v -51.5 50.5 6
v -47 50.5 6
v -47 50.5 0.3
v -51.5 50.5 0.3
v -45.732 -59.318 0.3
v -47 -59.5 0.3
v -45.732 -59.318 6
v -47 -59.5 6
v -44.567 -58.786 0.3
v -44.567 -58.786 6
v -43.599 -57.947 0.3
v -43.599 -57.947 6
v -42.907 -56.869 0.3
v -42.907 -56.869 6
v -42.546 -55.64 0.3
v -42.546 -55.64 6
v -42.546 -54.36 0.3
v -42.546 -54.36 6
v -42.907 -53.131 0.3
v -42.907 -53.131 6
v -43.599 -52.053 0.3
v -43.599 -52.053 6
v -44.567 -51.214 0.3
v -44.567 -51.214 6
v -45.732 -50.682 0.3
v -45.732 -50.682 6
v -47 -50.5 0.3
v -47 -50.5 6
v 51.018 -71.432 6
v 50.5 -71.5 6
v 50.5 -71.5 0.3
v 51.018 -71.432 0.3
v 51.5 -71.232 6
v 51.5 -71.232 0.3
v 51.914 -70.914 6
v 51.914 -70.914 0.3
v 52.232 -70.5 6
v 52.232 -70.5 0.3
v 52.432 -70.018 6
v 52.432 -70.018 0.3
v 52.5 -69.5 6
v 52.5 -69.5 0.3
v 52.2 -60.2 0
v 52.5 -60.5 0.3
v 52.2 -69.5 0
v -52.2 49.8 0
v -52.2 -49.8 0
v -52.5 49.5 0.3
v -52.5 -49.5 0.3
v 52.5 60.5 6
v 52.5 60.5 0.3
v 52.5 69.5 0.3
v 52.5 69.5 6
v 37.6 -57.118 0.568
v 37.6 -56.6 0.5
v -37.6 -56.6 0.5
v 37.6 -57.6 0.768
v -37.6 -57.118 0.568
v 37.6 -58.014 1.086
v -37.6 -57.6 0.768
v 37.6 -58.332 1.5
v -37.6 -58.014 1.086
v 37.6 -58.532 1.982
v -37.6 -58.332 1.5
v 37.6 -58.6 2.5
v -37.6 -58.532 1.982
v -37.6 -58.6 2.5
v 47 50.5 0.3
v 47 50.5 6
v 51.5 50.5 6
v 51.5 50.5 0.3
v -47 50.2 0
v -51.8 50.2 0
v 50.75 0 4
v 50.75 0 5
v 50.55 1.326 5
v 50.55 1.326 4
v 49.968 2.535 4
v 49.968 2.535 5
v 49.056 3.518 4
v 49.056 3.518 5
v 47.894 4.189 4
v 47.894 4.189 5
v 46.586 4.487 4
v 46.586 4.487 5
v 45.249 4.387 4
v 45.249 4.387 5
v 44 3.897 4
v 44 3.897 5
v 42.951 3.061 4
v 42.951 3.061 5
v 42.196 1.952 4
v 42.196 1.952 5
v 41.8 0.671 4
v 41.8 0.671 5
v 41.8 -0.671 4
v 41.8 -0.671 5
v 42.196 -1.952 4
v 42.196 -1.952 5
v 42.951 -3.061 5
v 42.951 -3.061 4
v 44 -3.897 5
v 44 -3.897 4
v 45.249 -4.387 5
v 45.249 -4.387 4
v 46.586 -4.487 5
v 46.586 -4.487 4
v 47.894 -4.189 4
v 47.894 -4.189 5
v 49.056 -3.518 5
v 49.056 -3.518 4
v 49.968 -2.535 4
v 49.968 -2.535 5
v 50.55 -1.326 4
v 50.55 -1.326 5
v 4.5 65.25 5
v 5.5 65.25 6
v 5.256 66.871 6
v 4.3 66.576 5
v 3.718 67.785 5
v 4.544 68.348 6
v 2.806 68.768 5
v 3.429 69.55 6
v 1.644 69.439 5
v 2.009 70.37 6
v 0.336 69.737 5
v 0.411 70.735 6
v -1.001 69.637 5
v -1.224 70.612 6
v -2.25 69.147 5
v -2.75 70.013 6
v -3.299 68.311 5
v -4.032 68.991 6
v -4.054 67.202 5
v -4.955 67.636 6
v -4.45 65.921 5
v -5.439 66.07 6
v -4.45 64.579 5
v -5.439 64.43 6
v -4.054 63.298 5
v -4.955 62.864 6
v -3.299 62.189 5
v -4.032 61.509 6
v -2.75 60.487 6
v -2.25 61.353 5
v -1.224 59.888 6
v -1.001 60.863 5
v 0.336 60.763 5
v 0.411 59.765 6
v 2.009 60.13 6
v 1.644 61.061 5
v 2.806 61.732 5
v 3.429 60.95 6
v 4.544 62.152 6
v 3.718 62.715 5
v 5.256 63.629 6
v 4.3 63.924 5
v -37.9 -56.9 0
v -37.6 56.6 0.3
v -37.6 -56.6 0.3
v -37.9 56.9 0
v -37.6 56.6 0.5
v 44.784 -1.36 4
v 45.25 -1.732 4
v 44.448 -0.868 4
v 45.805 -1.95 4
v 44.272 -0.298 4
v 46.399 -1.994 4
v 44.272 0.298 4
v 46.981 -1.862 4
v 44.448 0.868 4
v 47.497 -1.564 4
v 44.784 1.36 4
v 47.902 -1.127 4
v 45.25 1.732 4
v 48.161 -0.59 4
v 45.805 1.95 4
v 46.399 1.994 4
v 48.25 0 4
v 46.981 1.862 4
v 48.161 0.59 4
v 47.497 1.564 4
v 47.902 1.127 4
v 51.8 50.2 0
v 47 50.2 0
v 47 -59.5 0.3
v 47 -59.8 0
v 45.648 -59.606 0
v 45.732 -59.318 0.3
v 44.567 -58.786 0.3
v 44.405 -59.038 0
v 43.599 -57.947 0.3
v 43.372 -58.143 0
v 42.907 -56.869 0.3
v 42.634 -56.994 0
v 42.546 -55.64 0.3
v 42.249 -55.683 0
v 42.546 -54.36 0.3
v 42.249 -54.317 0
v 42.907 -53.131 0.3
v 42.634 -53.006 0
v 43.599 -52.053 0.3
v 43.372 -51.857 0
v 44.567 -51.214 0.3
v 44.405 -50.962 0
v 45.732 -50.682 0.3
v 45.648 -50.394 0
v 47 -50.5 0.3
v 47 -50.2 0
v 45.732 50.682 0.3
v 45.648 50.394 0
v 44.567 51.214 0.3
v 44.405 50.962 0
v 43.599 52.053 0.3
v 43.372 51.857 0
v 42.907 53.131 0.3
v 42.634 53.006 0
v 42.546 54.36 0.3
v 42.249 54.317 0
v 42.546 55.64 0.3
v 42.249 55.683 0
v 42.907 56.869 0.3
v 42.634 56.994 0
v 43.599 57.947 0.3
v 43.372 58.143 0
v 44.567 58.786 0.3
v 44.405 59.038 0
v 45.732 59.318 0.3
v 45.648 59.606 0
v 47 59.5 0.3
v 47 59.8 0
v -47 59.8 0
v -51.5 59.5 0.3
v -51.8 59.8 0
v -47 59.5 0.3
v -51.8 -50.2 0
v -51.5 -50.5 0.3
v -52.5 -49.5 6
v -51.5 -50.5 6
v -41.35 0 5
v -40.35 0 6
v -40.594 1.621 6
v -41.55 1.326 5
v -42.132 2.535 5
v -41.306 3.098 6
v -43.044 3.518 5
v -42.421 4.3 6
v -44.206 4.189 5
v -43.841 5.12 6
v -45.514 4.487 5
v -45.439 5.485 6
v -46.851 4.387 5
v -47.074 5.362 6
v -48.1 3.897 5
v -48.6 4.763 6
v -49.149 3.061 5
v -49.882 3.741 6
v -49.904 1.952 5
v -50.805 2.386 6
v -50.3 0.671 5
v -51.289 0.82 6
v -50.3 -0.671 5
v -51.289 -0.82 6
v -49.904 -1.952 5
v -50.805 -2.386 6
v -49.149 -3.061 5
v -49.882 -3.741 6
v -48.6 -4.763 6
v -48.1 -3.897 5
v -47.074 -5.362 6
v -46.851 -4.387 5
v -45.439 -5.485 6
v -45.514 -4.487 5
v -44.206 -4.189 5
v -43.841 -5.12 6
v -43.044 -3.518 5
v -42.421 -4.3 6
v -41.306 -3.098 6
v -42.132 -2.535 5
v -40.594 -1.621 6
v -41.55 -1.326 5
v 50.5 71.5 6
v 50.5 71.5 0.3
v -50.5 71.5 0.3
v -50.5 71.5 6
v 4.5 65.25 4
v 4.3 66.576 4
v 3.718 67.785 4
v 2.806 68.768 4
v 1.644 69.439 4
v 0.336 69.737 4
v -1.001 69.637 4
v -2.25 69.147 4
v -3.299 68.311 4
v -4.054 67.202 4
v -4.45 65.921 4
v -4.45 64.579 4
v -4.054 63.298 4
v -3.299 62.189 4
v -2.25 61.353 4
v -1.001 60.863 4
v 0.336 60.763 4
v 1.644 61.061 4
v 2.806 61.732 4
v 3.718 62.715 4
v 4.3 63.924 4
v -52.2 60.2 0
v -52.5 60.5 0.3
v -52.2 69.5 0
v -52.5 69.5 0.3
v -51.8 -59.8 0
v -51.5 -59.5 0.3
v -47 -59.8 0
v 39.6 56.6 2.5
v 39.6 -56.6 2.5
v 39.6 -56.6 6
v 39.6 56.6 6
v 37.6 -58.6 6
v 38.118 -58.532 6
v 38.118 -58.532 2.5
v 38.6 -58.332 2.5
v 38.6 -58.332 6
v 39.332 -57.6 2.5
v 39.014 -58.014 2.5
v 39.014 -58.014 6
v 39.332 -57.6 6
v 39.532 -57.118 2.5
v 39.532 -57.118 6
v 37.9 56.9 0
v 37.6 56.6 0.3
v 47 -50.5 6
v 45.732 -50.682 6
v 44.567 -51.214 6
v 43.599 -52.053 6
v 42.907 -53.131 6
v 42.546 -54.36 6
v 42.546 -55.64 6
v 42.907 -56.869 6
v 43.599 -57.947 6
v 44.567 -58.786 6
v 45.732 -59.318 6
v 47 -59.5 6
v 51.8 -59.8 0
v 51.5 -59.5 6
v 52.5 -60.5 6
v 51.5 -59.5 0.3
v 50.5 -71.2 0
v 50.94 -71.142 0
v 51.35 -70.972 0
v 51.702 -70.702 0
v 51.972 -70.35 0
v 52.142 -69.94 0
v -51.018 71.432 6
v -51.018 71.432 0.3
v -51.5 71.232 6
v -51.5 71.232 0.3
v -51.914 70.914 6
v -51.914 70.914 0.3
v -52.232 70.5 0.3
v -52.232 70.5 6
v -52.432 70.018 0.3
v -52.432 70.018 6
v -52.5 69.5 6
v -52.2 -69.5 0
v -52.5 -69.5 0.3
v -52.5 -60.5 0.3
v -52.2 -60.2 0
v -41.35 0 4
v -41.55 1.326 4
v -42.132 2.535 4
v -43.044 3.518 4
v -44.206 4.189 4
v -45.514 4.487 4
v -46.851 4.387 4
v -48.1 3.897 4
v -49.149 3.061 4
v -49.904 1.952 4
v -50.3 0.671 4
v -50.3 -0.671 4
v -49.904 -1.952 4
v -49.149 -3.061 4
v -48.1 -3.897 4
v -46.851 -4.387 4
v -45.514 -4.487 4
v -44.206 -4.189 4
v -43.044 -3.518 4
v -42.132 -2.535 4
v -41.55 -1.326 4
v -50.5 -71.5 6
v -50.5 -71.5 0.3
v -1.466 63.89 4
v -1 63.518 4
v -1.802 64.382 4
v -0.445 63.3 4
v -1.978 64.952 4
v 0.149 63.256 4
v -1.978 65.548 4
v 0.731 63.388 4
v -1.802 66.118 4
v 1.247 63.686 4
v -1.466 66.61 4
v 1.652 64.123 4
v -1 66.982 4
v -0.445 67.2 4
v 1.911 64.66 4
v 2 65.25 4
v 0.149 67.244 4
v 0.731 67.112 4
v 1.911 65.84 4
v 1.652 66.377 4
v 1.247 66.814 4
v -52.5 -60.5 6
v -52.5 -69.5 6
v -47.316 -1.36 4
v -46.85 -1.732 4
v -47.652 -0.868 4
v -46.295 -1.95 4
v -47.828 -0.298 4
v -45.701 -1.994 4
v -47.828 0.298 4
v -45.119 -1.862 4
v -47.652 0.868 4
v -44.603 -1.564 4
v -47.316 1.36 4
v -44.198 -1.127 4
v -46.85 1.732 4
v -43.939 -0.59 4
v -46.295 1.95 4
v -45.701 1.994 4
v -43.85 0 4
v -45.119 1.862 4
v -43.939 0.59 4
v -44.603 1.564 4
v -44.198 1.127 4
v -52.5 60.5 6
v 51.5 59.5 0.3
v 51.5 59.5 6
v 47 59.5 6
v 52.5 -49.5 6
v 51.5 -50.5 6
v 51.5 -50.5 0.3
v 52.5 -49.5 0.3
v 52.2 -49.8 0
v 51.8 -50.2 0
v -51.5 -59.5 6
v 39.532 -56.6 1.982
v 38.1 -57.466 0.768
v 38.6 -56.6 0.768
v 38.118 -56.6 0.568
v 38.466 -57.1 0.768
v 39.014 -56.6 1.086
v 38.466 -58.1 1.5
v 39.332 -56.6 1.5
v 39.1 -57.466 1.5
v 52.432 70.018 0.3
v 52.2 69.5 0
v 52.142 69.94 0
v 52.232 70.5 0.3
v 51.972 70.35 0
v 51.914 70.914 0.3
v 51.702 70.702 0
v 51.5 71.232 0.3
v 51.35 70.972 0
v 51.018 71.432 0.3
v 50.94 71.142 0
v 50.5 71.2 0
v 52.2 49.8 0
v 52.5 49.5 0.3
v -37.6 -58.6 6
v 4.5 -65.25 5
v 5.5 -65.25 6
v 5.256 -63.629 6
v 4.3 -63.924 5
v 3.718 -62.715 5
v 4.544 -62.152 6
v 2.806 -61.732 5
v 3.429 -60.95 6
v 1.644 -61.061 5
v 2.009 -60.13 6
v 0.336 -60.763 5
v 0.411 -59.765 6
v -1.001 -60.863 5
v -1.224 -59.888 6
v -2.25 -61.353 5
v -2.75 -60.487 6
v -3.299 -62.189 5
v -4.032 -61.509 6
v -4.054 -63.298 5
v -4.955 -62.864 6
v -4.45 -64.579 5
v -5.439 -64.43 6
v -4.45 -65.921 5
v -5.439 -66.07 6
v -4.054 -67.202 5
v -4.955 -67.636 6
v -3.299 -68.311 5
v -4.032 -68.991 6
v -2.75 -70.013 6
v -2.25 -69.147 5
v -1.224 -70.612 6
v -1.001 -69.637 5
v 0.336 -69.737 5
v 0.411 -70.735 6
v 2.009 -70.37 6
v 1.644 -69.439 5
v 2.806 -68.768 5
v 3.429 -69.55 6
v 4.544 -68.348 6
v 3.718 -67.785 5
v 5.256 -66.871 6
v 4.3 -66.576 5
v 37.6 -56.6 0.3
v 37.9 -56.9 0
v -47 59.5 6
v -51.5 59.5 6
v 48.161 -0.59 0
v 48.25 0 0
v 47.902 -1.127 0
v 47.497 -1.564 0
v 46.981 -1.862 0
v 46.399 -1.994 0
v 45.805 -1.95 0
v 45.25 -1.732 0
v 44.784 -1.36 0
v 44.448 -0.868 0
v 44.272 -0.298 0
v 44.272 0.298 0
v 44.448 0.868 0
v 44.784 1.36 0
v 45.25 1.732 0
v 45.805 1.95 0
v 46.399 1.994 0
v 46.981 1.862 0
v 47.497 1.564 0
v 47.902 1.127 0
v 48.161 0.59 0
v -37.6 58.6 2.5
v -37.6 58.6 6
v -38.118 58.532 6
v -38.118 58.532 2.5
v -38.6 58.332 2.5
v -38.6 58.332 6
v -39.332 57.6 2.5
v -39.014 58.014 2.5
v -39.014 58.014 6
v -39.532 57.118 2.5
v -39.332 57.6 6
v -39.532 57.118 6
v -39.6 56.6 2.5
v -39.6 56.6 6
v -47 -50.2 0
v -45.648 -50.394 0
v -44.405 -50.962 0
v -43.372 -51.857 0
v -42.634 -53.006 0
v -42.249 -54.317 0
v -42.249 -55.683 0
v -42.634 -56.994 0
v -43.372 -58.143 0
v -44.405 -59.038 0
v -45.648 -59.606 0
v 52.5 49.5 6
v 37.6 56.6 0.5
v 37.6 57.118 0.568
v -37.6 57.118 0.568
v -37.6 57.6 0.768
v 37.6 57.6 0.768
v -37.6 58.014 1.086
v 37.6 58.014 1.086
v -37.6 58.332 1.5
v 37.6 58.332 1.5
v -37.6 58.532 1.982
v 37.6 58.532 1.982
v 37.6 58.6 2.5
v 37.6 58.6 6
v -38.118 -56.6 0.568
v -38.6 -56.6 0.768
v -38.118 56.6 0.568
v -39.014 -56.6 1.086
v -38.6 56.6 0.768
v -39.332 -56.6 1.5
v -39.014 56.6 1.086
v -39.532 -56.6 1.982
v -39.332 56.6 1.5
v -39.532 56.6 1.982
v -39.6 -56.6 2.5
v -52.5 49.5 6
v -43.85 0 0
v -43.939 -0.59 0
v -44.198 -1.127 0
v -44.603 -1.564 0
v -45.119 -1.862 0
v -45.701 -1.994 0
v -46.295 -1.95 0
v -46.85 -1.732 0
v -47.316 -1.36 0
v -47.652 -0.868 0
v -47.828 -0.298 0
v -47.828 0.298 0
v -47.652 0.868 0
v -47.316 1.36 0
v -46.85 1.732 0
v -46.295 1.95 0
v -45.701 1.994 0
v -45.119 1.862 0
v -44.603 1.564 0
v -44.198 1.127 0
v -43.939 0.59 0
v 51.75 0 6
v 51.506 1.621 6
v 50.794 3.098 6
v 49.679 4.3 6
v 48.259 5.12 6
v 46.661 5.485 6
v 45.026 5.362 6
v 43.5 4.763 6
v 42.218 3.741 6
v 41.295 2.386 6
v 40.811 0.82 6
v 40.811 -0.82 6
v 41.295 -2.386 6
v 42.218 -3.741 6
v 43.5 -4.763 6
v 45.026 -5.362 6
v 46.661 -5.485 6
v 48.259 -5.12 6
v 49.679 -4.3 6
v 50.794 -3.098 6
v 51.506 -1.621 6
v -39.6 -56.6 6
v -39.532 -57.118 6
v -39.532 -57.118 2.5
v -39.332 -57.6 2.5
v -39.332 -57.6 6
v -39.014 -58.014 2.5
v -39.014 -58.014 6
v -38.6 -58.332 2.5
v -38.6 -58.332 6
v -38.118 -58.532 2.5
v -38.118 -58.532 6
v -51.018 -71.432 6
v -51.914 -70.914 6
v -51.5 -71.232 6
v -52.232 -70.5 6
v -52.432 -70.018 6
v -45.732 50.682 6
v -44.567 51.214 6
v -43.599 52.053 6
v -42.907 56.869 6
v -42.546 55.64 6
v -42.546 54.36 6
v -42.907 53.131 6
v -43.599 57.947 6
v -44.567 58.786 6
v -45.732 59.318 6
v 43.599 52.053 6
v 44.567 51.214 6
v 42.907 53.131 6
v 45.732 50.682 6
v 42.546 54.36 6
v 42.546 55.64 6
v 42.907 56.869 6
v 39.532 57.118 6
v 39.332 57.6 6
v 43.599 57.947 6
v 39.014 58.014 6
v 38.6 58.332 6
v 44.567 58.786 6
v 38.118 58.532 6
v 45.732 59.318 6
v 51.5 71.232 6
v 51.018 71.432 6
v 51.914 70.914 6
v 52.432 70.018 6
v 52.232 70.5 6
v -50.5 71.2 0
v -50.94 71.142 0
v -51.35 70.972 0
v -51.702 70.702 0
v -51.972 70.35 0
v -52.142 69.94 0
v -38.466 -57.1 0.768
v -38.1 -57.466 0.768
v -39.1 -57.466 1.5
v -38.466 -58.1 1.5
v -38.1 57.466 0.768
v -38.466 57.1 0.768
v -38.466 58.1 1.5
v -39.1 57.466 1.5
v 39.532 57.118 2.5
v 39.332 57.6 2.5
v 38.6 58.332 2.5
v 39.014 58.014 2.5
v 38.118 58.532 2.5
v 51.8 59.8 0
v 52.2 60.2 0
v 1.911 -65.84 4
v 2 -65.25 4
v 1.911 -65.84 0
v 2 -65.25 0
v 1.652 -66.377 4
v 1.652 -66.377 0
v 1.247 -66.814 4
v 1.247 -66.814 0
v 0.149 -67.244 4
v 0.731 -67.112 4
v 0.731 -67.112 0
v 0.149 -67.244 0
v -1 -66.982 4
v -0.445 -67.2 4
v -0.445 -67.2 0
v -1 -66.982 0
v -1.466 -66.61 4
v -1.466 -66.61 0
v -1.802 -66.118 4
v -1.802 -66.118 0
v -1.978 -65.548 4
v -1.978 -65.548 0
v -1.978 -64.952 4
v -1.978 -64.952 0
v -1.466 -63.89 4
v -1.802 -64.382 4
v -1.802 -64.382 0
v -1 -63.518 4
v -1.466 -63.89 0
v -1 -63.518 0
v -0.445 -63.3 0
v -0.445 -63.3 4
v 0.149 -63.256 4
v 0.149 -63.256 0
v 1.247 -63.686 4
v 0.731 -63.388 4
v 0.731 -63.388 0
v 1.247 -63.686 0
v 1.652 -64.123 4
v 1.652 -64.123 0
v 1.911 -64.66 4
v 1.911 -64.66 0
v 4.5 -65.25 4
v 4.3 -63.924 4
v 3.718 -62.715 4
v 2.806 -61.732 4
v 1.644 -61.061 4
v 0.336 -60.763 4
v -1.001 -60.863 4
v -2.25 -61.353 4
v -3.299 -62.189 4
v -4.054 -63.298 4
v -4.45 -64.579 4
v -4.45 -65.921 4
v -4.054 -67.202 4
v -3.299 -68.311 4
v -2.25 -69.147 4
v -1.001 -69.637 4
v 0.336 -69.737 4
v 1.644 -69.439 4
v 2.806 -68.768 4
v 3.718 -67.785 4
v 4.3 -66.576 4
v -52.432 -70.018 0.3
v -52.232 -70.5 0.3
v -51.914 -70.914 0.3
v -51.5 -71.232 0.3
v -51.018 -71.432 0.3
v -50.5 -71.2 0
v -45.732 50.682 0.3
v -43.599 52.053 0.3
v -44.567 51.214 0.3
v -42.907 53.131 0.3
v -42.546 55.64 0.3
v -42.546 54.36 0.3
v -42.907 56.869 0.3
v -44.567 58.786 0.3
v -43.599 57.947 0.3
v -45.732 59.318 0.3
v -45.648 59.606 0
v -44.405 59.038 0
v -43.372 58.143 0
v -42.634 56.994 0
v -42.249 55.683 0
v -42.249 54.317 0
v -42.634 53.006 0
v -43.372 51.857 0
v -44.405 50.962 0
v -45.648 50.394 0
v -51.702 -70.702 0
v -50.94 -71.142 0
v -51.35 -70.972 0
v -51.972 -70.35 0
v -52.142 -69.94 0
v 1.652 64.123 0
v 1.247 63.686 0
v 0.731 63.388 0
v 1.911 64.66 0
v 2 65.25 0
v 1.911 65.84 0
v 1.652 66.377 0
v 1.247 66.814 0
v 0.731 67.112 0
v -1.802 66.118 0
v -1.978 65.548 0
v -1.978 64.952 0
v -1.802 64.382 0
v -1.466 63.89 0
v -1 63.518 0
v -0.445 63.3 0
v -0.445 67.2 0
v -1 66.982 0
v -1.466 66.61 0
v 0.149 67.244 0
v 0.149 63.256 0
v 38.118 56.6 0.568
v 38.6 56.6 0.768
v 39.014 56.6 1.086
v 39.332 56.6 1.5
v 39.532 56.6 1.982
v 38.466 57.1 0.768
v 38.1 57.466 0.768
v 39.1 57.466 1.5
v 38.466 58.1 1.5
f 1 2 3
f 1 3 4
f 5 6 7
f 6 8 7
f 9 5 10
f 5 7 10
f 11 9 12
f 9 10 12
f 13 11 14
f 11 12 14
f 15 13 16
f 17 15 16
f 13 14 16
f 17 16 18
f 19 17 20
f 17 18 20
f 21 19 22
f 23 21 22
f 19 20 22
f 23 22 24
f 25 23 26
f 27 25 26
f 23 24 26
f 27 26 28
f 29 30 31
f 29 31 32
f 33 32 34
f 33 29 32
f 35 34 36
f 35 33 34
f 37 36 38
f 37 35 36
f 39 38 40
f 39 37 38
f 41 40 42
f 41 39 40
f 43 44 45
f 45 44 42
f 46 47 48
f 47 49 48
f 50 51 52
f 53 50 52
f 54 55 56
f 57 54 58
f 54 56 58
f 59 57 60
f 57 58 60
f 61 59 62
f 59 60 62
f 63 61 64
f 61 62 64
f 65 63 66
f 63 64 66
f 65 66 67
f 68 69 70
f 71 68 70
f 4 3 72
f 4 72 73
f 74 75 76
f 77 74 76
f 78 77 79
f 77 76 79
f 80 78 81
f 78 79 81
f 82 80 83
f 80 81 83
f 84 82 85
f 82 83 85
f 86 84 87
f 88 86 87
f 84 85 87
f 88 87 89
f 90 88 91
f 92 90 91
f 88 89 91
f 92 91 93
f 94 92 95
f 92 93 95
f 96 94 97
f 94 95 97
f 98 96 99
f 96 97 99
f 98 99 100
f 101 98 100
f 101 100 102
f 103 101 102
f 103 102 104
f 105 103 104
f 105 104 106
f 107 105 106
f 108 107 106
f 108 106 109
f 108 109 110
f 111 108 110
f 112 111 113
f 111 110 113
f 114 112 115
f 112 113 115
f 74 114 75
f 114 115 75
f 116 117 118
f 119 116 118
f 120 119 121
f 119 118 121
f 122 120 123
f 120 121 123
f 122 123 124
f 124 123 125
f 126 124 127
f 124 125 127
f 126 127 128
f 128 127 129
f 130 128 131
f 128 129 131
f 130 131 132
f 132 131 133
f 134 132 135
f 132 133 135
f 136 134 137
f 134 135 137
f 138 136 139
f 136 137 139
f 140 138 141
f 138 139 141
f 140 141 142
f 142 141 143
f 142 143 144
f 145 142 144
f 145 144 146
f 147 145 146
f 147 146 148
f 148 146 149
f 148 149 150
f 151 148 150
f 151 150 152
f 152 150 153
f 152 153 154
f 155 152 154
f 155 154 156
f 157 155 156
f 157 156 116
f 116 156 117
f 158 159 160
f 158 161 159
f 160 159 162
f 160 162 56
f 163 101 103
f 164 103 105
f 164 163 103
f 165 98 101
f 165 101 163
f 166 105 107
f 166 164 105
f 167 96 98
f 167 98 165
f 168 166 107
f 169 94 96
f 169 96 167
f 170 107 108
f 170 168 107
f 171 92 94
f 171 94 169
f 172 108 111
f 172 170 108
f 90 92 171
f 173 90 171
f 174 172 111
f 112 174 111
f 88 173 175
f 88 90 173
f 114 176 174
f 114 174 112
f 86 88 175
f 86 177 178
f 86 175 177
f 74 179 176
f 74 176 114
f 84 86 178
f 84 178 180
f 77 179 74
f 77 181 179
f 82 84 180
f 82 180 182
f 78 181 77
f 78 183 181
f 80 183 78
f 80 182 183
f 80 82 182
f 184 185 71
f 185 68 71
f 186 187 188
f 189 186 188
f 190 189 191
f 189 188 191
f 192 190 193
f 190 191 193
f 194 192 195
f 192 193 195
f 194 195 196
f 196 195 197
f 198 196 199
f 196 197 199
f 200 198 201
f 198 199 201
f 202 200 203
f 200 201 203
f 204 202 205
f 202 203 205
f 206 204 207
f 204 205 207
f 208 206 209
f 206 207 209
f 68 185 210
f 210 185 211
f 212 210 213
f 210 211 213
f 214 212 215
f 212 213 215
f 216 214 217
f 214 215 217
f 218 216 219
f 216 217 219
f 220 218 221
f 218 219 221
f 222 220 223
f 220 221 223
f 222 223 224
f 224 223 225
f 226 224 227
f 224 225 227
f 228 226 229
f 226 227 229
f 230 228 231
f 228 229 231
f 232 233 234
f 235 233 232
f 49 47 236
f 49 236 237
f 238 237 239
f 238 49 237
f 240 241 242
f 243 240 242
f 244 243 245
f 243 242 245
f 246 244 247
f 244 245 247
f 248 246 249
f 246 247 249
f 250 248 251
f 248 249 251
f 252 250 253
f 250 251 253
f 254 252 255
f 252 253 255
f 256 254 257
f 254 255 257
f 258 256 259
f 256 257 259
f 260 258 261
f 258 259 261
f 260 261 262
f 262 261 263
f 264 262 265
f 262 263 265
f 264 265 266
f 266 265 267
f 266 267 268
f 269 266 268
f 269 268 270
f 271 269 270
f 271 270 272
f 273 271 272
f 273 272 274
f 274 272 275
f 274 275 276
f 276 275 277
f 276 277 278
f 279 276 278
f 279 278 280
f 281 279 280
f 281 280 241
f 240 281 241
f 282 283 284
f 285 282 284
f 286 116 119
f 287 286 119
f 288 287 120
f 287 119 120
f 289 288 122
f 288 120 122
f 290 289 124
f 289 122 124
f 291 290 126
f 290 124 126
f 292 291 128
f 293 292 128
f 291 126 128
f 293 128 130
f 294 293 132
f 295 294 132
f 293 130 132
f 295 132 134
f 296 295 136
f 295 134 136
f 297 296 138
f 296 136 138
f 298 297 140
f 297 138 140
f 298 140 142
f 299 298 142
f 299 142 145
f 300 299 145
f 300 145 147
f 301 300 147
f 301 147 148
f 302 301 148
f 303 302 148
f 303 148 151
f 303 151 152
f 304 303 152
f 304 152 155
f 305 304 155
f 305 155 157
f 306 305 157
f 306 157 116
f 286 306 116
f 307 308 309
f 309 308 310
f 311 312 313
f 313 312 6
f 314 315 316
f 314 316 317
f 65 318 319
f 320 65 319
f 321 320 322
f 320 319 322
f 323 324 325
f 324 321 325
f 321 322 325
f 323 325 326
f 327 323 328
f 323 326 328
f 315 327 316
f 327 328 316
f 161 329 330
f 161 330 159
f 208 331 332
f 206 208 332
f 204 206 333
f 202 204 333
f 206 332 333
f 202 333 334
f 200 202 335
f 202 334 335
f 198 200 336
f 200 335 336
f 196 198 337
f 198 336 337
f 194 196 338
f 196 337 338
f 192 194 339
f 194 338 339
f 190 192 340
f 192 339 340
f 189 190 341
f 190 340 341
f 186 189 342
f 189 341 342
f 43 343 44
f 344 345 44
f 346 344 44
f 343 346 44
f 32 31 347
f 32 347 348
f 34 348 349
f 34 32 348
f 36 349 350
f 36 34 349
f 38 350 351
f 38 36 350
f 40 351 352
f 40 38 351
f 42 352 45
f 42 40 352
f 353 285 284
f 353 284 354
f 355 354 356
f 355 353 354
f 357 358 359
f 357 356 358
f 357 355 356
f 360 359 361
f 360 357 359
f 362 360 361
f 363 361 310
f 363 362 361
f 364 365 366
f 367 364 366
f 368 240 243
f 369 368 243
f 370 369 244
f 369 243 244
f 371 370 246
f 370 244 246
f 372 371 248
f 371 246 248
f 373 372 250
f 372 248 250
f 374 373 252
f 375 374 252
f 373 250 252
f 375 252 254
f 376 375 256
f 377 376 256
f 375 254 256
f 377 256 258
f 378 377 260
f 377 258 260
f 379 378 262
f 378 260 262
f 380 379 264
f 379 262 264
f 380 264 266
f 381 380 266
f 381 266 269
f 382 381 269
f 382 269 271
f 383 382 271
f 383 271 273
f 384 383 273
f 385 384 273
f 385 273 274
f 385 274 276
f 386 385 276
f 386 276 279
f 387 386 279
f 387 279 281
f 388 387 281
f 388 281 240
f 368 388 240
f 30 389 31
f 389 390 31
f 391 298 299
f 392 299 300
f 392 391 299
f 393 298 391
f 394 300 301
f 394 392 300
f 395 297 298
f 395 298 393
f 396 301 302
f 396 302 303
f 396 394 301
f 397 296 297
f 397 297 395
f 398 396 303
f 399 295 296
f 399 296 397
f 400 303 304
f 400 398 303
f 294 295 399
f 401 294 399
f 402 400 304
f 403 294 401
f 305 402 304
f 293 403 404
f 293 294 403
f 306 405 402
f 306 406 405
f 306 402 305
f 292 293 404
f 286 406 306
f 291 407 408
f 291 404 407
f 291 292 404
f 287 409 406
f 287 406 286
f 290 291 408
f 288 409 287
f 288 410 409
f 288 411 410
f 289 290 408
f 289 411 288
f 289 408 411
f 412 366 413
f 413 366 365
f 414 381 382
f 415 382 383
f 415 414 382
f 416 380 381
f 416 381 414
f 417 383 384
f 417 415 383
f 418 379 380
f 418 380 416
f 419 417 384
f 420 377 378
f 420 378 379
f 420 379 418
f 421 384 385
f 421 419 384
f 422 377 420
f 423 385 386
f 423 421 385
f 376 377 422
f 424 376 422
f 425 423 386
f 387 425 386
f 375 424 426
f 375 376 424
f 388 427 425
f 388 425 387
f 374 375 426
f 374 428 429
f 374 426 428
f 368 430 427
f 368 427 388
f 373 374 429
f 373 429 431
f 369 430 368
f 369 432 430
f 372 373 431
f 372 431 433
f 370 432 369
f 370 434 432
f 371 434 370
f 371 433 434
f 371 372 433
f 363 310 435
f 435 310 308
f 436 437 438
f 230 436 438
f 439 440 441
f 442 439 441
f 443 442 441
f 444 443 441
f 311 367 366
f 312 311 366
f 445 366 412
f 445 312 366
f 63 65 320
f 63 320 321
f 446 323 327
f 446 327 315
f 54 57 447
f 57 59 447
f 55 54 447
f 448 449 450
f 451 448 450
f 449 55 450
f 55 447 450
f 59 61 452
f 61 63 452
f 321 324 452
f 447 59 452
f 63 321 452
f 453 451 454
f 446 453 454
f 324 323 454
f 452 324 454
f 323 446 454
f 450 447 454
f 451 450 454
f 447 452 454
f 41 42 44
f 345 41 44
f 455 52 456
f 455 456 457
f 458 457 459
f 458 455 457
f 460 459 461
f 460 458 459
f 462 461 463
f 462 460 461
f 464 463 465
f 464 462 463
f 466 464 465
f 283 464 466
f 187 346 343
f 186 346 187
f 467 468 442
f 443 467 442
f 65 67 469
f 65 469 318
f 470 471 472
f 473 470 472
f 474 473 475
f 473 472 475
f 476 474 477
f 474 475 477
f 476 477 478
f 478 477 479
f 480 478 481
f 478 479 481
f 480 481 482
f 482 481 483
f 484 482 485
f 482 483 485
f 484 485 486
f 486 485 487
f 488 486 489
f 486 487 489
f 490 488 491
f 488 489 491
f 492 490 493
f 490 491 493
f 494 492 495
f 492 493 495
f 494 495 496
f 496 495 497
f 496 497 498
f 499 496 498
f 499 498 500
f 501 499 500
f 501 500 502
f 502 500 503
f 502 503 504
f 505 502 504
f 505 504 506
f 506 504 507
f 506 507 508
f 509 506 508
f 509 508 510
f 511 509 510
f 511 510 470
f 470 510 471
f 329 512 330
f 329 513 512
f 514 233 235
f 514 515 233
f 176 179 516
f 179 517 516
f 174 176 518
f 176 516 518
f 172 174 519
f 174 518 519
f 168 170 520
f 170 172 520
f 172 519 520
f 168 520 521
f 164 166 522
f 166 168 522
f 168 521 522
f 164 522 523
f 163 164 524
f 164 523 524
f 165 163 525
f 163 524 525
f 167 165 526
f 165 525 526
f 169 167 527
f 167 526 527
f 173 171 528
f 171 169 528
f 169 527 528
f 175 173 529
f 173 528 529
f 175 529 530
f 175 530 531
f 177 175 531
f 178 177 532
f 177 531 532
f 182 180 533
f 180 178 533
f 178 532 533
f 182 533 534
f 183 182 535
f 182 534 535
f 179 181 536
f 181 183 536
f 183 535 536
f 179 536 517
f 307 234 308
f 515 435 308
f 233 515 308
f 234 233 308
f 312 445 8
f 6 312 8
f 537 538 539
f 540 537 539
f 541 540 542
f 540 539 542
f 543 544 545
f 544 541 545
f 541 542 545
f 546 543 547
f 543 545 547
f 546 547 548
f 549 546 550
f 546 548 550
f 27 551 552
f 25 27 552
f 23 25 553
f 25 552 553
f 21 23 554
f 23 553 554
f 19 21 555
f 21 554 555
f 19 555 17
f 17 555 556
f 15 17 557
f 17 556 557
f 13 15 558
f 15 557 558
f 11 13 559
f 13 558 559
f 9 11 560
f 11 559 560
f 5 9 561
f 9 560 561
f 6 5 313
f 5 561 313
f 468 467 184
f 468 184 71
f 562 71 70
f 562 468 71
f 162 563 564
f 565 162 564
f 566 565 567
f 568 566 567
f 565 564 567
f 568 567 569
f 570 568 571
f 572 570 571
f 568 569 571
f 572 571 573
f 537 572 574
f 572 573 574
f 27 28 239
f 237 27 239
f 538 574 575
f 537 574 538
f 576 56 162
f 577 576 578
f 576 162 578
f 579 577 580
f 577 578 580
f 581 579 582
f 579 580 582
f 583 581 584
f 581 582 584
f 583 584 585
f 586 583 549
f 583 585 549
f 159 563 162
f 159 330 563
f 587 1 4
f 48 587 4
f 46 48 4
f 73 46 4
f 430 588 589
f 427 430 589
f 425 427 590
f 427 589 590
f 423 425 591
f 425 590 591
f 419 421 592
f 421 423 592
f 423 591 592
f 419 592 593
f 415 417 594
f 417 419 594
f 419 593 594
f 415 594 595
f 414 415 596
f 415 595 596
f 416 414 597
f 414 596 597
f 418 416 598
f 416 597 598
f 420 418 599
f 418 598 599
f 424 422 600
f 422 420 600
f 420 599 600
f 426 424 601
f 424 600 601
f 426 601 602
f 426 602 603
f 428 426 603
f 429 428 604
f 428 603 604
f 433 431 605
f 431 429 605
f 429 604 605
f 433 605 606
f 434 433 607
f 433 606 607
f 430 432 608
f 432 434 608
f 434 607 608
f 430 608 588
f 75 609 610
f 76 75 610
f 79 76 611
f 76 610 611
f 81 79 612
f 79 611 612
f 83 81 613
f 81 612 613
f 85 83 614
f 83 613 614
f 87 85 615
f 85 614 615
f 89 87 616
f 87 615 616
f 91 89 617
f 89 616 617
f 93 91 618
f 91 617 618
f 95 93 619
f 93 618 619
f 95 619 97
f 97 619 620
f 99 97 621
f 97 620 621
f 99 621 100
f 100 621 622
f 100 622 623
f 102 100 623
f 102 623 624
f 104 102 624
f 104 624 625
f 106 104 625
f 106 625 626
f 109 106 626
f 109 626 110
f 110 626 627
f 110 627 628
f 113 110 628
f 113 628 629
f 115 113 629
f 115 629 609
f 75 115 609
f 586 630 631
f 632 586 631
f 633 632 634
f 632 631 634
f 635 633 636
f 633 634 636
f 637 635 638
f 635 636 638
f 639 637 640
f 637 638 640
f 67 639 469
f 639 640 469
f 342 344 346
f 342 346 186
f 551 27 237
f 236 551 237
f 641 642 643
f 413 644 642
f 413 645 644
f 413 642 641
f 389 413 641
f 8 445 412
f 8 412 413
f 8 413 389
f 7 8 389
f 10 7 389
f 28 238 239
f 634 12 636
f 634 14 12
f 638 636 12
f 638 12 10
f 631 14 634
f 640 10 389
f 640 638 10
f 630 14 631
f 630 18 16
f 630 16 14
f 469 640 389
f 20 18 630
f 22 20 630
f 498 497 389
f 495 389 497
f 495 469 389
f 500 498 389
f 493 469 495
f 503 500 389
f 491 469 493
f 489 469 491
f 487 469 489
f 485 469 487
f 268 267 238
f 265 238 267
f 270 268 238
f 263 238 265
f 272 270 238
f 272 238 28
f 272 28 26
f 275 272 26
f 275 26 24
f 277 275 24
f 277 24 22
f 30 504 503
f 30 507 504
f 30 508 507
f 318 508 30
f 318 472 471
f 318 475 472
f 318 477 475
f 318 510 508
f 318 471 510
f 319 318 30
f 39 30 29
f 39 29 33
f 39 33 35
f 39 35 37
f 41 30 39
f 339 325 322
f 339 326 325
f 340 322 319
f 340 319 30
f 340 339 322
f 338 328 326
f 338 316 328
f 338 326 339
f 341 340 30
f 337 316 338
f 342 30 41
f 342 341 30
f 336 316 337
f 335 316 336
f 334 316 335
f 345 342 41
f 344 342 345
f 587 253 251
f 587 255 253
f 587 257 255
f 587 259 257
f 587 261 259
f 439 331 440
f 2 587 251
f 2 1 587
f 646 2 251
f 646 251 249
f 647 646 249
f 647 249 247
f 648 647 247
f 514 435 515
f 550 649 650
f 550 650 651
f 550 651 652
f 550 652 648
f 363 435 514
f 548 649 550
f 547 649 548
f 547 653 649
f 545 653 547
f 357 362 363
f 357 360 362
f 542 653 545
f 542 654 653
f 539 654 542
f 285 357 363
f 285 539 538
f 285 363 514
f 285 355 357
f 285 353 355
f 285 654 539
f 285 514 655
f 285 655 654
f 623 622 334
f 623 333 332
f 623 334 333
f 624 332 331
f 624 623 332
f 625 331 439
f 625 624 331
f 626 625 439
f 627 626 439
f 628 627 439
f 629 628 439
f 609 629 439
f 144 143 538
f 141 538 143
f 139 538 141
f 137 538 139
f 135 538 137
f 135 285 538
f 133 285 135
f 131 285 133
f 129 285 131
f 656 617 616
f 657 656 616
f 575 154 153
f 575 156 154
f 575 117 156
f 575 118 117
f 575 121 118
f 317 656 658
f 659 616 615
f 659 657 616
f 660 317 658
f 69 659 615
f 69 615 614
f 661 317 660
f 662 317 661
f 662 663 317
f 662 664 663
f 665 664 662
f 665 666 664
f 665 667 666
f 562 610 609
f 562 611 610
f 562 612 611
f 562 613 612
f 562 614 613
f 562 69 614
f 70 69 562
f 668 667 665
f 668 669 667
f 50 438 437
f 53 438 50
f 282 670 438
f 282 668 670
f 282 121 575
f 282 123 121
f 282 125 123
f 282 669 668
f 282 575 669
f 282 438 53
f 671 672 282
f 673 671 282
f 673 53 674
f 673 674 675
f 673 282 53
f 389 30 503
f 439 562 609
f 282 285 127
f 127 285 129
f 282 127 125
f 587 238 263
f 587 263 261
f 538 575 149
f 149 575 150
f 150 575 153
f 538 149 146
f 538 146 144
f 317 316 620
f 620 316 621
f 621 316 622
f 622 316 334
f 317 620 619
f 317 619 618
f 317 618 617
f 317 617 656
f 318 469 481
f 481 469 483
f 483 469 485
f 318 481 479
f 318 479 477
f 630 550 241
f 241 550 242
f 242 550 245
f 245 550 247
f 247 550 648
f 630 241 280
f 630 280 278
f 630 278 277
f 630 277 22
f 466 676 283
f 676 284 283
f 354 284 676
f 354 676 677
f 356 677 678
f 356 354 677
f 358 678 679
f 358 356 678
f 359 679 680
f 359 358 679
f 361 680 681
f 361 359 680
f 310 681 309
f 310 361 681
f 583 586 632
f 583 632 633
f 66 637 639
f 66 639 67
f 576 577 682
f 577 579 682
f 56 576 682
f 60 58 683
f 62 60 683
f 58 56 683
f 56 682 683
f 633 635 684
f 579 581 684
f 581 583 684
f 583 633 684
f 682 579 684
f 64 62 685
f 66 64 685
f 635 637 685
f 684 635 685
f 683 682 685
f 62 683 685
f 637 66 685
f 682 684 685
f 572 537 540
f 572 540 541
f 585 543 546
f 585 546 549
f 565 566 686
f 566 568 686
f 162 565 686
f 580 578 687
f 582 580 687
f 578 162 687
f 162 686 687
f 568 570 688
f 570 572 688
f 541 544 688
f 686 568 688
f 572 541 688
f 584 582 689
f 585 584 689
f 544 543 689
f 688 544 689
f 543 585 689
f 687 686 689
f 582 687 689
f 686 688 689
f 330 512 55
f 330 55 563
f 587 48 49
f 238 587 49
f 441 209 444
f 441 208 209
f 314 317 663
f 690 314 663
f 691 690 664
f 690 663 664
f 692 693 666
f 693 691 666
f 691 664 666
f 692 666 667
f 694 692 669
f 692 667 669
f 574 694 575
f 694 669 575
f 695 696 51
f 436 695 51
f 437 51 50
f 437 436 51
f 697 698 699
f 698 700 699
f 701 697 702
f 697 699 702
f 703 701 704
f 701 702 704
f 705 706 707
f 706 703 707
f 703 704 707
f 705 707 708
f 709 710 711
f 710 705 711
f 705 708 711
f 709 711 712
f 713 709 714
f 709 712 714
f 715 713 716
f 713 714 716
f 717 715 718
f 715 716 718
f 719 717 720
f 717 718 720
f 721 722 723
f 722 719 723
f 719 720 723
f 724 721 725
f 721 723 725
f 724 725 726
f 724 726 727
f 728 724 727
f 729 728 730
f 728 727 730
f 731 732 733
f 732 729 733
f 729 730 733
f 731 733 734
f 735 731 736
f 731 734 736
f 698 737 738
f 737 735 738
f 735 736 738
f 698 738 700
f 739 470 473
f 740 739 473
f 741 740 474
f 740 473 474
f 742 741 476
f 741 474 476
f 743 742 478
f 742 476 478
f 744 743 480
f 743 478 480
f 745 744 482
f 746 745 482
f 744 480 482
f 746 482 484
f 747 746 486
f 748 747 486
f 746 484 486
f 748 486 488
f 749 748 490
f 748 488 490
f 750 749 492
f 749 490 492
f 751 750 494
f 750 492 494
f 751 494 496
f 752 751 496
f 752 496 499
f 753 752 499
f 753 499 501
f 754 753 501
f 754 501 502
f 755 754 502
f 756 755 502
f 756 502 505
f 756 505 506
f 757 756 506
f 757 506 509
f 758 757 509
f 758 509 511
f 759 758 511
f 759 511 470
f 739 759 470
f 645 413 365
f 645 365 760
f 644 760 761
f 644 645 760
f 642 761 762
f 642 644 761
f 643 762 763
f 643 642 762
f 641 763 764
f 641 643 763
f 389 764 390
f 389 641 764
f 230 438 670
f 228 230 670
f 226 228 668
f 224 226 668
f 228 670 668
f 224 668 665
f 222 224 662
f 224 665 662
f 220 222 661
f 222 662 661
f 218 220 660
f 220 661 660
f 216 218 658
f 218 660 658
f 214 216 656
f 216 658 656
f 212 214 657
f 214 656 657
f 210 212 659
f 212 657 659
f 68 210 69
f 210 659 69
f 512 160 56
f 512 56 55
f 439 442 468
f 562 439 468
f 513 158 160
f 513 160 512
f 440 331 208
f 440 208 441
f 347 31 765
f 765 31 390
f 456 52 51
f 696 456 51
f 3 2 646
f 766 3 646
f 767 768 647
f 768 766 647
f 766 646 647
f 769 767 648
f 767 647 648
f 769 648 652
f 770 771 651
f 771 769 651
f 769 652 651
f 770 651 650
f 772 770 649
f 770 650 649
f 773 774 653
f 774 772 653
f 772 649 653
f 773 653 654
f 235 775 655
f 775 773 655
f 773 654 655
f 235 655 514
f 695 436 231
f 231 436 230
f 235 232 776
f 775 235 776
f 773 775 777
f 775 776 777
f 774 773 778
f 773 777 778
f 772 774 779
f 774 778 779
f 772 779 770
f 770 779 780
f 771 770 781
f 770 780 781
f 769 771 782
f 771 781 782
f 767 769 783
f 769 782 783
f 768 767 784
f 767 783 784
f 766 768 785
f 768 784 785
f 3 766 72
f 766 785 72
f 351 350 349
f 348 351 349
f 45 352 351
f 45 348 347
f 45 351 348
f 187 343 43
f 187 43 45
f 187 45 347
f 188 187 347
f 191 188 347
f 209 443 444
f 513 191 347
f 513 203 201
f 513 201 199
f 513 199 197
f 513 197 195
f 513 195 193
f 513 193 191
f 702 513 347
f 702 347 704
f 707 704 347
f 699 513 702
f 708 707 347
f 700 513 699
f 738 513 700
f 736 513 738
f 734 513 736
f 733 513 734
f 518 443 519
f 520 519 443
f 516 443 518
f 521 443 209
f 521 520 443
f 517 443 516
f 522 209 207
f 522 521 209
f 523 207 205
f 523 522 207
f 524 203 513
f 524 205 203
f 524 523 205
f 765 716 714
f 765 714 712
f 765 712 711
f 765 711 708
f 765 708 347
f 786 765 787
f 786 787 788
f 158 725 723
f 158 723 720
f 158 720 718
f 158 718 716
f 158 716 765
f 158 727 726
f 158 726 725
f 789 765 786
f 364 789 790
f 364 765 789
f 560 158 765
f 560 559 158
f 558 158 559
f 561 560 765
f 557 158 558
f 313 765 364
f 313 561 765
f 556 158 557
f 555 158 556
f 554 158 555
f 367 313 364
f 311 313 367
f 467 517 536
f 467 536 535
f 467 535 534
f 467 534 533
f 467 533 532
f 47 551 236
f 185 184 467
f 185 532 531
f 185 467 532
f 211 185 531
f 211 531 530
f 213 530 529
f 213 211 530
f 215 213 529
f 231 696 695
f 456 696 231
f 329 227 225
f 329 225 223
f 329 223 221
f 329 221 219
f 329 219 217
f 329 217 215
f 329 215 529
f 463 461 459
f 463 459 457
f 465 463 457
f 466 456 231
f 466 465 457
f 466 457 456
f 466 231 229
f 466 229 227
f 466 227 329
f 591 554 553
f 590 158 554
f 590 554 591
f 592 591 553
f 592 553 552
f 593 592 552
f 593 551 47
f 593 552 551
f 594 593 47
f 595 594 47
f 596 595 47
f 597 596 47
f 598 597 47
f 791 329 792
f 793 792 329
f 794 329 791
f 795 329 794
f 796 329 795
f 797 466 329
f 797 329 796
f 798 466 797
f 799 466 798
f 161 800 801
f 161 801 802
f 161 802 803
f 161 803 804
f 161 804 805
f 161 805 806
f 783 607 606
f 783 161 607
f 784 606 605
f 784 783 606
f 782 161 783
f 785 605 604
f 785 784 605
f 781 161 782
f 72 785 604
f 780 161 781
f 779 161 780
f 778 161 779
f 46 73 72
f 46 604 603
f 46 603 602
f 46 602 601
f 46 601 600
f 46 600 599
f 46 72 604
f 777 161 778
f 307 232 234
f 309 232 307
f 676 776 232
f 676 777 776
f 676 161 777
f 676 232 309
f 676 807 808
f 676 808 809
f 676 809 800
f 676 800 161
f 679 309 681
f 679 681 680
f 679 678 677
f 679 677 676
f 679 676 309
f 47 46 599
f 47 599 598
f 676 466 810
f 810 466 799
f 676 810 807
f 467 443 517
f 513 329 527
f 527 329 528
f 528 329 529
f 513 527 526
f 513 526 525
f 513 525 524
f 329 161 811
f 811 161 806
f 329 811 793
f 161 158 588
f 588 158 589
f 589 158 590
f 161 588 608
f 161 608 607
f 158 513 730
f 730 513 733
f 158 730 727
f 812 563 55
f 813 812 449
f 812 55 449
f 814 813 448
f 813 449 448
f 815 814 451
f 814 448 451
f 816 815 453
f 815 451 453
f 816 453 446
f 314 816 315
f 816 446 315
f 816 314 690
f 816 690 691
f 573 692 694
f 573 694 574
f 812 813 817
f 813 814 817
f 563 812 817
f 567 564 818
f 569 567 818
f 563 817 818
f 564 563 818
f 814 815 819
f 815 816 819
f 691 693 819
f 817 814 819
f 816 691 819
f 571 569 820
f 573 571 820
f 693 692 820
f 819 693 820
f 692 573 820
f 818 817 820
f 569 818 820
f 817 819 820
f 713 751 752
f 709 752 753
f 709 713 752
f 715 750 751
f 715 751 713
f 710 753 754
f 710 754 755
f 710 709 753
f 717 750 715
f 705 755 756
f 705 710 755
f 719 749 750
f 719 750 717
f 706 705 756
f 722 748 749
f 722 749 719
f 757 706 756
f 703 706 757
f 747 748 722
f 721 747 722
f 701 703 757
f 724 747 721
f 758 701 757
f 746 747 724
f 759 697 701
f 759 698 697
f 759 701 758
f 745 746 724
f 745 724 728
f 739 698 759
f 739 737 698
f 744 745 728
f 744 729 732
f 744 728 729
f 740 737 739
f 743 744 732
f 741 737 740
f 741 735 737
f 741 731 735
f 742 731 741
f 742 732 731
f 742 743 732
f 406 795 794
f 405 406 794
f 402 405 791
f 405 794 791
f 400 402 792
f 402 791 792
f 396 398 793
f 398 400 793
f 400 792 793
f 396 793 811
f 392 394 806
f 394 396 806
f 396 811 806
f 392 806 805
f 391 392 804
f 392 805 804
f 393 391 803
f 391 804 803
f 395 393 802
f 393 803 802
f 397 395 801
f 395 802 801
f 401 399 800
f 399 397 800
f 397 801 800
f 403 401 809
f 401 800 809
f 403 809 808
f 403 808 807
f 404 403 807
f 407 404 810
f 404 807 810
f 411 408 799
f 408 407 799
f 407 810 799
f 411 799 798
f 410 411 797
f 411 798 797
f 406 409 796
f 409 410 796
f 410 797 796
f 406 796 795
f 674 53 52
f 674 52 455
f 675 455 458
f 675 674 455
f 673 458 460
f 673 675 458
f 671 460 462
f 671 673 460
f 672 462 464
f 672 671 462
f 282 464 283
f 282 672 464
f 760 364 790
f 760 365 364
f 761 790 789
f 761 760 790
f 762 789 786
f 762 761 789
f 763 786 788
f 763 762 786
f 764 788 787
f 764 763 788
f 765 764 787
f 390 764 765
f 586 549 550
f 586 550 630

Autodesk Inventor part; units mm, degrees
ref_plane "YZ Plane" through (0, 0, 0) normal (1, 0, 0) x (0, 1, 0)
ref_plane "XZ Plane" through (0, 0, 0) normal (0, 1, 0) x (-1, 0, 0)
ref_plane "XY Plane" through (0, 0, 0) normal (0, 0, 1) x (1, 0, 0)
sketch "Sketch1" plane through (0, 0, 0) normal (0, 0, 1) x (1, 0, 0)
  line L0 (-39.6, -58.6) -> (39.6, -58.6)
  line L1 (39.6, -58.6) -> (39.6, 58.6)
  line L2 (39.6, 58.6) -> (-39.6, 58.6)
  line L3 (-39.6, 58.6) -> (-39.6, -58.6)
  line L4 (-39.6, -58.6) -> (39.6, 58.6) construction
  line L5 (39.6, -58.6) -> (-39.6, 58.6) construction
  line L6 (-52.5, -71.5) -> (52.5, -71.5)
  line L7 (52.5, -71.5) -> (52.5, 71.5)
  line L8 (52.5, 71.5) -> (-52.5, 71.5)
  line L9 (-52.5, 71.5) -> (-52.5, -71.5)
  line L10 (-52.5, -71.5) -> (52.5, 71.5) construction
  line L11 (52.5, -71.5) -> (-52.5, 71.5) construction
  line L12 (0, 100.1) -> (0, -100.1) projected
  line L13 (-73.5, 0) -> (73.5, 0) projected
  circle A0 centre (-45.85, 0) radius 2
  circle A1 centre (46.25, 0) radius 2
  circle A2 centre (0, 65.25) radius 2
  circle A3 centre (0, -65.25) radius 2
  point P0 (0, 0)
  dimension "d0" = 79.2
  dimension "d1" = 117.2
  dimension "d2" = 105
  dimension "d4" = 12.9
  dimension "d6" = 6.25
  dimension "d7" = 6.25
  dimension "d8" = 6.25
  dimension "d9" = 6.25
  dimension "d10" = 4
  dimension "d11" = 4
  dimension "d12" = 4
  dimension "d40" = 143
  dimension "d41" = 4
extrude "Extrusion1" add sketch "Sketch1" along normal blind 6 contours L0 L12 A3 L6 L9 L13 A0 L3 | L0 L1 L13 A1 L7 L6 L12 A3 | L13 A0 L9 L8 L12 A2 L2 L3 | L1 L2 L12 A2 L8 L7 L13 A1
fillet "Fillet1" radius 2 8 edges at (-39.6, 58.6, 3) (39.6, 58.6, 3) (39.6, -58.6, 3) (-39.6, -58.6, 3) (52.5, 71.5, 3) (-52.5, 71.5, 3) (-52.5, -71.5, 3) (52.5, -71.5, 3)
sketch "Sketch2" plane through (0, 0, 6) normal (0, 0, 1) x (1, 0, 0)
  circle A0 centre (0, 65.25) radius 2 projected
  circle A1 centre (46.25, 0) radius 2 projected
  circle A2 centre (0, -65.25) radius 2 projected
  circle A3 centre (-45.85, 0) radius 2 projected
  circle A4 centre (0, 65.25) radius 4.5
  circle A5 centre (46.25, 0) radius 4.5
  circle A6 centre (0, -65.25) radius 4.5
  circle A7 centre (-45.85, 0) radius 4.5
  point P0 (0, 0)
  dimension "d16" = 9
  dimension "d17" = 9
  dimension "d18" = 9
  dimension "d19" = 9
extrude "Extrusion2" cut sketch "Sketch2" against normal blind 2
chamfer "Chamfer1" distance 1 angle 45 4 edges at (-4.5, 65.25, 6) (-50.35, 0, 6) (41.75, 0, 6) (-4.5, -65.25, 6)
sketch "Sketch3" plane through (0, 0, 6) normal (0, 0, 1) x (1, 0, 0)
  circle A0 centre (-47, -55) radius 4.5
  line L0 (-73.5, 0) -> (73.5, 0) construction
  line L1 (0, 100.1) -> (0, -100.1) construction
  line L2 (-47, -50.5) -> (-52.5, -50.5)
  line L3 (-52.5, 69.5) -> (-52.5, -69.5) construction
  line L4 (-52.5, -50.5) -> (-52.5, -59.5)
  line L5 (-52.5, -59.5) -> (-47, -59.5)
  circle A1 centre (47, -55) radius 4.5
  line L6 (47, -50.5) -> (52.5, -50.5)
  line L7 (52.5, -50.5) -> (52.5, -59.5)
  line L8 (52.5, -59.5) -> (47, -59.5)
  circle A2 centre (-47, 55) radius 4.5
  line L9 (-47, 50.5) -> (-52.5, 50.5)
  line L10 (-52.5, 50.5) -> (-52.5, 59.5)
  line L11 (-52.5, 59.5) -> (-47, 59.5)
  circle A3 centre (47, 55) radius 4.5
  line L12 (47, 50.5) -> (52.5, 50.5)
  line L13 (52.5, 50.5) -> (52.5, 59.5)
  line L14 (52.5, 59.5) -> (47, 59.5)
  point P0 (0, 0)
  dimension "d25" = 9
  dimension "d26" = 55
  dimension "d27" = 47
extrude "Extrusion3" cut sketch "Sketch3" against normal through all
chamfer "Chamfer2" distance 1 angle 45 8 edges at (-52.5, -50.5, 3) (-52.5, -59.5, 3) (52.5, -59.5, 3) (52.5, -50.5, 3) (52.5, 59.5, 3) (52.5, 50.5, 3) (-52.5, 59.5, 3) (-52.5, 50.5, 3)
sketch "Sketch4" plane through (0, 0, 0) normal (0, 0, -1) x (-1, 0, 0)
  line L0 (37.6, 58.6) -> (-37.6, 58.6) projected
  arc A0 (39.6, 56.6) -> (37.6, 58.6) centre (37.6, 56.6) ccw projected
  line L1 (39.6, -56.6) -> (39.6, 56.6) projected
  arc A1 (37.6, -58.6) -> (39.6, -56.6) centre (37.6, -56.6) ccw projected
  line L2 (-37.6, -58.6) -> (37.6, -58.6) projected
  arc A2 (-39.6, -56.6) -> (-37.6, -58.6) centre (-37.6, -56.6) ccw projected
  line L3 (-39.6, 56.6) -> (-39.6, -56.6) projected
  arc A3 (-37.6, 58.6) -> (-39.6, 56.6) centre (-37.6, 56.6) ccw projected
  line L4 (-37.6, 56.6) -> (37.6, 56.6)
  line L5 (37.6, 56.6) -> (37.6, -56.6)
  line L6 (37.6, -56.6) -> (-37.6, -56.6)
  line L7 (-37.6, -56.6) -> (-37.6, 56.6)
  point P0 (0, 0)
  point P1 (37.6, 56.6)
  point P2 (-37.6, -56.6)
  dimension "d33" = 2
extrude "Extrusion4" add sketch "Sketch4" against normal blind 0.5
fillet "Fillet2" radius 2 8 edges at (39.0142, 58.0142, 0.5) (39.6, 0, 0.5) (39.0142, -58.0142, 0.5) (0, -58.6, 0.5) (-39.0142, -58.0142, 0.5) (-39.6, 0, 0.5) (-39.0142, 58.0142, 0.5) (0, 58.6, 0.5)
chamfer "Chamfer3" distance 0.3 angle 45 28 edges at (0, 71.5, 0) (-51.9142, 70.9142, 0) (-52.5, 65, 0) (51.9142, 70.9142, 0) (52.5, 65, 0) (42.5, 55, 0) (49.25, 50.5, 0) (49.25, 59.5, 0) (52.5, 0, 0) (42.5, -55, 0) (49.25, -59.5, 0) (49.25, -50.5, 0) (52.5, -65, 0) (51.9142, -70.9142, 0) (0, -71.5, 0) (-51.9142, -70.9142, 0) (-52.5, -65, 0) (-42.5, -55, 0) (-49.25, -50.5, 0) (-49.25, -59.5, 0) (-52.5, 0, 0) (-49.25, 59.5, 0) (-42.5, 55, 0) (-49.25, 50.5, 0) (0, 56.6, 0) (-37.6, 0, 0) (37.6, 0, 0) (0, -56.6, 0)
equation "\"d7\" = d6"
equation "\"d8\" = d6"
equation "\"d9\" = d6"
equation "\"d11\" = d10"
equation "\"d12\" = d10"
equation "\"d41\" = d11"
equation "\"d17\" = d16"
equation "\"d18\" = d16"
equation "\"d19\" = d18"
properties part number "_3DPrint"
